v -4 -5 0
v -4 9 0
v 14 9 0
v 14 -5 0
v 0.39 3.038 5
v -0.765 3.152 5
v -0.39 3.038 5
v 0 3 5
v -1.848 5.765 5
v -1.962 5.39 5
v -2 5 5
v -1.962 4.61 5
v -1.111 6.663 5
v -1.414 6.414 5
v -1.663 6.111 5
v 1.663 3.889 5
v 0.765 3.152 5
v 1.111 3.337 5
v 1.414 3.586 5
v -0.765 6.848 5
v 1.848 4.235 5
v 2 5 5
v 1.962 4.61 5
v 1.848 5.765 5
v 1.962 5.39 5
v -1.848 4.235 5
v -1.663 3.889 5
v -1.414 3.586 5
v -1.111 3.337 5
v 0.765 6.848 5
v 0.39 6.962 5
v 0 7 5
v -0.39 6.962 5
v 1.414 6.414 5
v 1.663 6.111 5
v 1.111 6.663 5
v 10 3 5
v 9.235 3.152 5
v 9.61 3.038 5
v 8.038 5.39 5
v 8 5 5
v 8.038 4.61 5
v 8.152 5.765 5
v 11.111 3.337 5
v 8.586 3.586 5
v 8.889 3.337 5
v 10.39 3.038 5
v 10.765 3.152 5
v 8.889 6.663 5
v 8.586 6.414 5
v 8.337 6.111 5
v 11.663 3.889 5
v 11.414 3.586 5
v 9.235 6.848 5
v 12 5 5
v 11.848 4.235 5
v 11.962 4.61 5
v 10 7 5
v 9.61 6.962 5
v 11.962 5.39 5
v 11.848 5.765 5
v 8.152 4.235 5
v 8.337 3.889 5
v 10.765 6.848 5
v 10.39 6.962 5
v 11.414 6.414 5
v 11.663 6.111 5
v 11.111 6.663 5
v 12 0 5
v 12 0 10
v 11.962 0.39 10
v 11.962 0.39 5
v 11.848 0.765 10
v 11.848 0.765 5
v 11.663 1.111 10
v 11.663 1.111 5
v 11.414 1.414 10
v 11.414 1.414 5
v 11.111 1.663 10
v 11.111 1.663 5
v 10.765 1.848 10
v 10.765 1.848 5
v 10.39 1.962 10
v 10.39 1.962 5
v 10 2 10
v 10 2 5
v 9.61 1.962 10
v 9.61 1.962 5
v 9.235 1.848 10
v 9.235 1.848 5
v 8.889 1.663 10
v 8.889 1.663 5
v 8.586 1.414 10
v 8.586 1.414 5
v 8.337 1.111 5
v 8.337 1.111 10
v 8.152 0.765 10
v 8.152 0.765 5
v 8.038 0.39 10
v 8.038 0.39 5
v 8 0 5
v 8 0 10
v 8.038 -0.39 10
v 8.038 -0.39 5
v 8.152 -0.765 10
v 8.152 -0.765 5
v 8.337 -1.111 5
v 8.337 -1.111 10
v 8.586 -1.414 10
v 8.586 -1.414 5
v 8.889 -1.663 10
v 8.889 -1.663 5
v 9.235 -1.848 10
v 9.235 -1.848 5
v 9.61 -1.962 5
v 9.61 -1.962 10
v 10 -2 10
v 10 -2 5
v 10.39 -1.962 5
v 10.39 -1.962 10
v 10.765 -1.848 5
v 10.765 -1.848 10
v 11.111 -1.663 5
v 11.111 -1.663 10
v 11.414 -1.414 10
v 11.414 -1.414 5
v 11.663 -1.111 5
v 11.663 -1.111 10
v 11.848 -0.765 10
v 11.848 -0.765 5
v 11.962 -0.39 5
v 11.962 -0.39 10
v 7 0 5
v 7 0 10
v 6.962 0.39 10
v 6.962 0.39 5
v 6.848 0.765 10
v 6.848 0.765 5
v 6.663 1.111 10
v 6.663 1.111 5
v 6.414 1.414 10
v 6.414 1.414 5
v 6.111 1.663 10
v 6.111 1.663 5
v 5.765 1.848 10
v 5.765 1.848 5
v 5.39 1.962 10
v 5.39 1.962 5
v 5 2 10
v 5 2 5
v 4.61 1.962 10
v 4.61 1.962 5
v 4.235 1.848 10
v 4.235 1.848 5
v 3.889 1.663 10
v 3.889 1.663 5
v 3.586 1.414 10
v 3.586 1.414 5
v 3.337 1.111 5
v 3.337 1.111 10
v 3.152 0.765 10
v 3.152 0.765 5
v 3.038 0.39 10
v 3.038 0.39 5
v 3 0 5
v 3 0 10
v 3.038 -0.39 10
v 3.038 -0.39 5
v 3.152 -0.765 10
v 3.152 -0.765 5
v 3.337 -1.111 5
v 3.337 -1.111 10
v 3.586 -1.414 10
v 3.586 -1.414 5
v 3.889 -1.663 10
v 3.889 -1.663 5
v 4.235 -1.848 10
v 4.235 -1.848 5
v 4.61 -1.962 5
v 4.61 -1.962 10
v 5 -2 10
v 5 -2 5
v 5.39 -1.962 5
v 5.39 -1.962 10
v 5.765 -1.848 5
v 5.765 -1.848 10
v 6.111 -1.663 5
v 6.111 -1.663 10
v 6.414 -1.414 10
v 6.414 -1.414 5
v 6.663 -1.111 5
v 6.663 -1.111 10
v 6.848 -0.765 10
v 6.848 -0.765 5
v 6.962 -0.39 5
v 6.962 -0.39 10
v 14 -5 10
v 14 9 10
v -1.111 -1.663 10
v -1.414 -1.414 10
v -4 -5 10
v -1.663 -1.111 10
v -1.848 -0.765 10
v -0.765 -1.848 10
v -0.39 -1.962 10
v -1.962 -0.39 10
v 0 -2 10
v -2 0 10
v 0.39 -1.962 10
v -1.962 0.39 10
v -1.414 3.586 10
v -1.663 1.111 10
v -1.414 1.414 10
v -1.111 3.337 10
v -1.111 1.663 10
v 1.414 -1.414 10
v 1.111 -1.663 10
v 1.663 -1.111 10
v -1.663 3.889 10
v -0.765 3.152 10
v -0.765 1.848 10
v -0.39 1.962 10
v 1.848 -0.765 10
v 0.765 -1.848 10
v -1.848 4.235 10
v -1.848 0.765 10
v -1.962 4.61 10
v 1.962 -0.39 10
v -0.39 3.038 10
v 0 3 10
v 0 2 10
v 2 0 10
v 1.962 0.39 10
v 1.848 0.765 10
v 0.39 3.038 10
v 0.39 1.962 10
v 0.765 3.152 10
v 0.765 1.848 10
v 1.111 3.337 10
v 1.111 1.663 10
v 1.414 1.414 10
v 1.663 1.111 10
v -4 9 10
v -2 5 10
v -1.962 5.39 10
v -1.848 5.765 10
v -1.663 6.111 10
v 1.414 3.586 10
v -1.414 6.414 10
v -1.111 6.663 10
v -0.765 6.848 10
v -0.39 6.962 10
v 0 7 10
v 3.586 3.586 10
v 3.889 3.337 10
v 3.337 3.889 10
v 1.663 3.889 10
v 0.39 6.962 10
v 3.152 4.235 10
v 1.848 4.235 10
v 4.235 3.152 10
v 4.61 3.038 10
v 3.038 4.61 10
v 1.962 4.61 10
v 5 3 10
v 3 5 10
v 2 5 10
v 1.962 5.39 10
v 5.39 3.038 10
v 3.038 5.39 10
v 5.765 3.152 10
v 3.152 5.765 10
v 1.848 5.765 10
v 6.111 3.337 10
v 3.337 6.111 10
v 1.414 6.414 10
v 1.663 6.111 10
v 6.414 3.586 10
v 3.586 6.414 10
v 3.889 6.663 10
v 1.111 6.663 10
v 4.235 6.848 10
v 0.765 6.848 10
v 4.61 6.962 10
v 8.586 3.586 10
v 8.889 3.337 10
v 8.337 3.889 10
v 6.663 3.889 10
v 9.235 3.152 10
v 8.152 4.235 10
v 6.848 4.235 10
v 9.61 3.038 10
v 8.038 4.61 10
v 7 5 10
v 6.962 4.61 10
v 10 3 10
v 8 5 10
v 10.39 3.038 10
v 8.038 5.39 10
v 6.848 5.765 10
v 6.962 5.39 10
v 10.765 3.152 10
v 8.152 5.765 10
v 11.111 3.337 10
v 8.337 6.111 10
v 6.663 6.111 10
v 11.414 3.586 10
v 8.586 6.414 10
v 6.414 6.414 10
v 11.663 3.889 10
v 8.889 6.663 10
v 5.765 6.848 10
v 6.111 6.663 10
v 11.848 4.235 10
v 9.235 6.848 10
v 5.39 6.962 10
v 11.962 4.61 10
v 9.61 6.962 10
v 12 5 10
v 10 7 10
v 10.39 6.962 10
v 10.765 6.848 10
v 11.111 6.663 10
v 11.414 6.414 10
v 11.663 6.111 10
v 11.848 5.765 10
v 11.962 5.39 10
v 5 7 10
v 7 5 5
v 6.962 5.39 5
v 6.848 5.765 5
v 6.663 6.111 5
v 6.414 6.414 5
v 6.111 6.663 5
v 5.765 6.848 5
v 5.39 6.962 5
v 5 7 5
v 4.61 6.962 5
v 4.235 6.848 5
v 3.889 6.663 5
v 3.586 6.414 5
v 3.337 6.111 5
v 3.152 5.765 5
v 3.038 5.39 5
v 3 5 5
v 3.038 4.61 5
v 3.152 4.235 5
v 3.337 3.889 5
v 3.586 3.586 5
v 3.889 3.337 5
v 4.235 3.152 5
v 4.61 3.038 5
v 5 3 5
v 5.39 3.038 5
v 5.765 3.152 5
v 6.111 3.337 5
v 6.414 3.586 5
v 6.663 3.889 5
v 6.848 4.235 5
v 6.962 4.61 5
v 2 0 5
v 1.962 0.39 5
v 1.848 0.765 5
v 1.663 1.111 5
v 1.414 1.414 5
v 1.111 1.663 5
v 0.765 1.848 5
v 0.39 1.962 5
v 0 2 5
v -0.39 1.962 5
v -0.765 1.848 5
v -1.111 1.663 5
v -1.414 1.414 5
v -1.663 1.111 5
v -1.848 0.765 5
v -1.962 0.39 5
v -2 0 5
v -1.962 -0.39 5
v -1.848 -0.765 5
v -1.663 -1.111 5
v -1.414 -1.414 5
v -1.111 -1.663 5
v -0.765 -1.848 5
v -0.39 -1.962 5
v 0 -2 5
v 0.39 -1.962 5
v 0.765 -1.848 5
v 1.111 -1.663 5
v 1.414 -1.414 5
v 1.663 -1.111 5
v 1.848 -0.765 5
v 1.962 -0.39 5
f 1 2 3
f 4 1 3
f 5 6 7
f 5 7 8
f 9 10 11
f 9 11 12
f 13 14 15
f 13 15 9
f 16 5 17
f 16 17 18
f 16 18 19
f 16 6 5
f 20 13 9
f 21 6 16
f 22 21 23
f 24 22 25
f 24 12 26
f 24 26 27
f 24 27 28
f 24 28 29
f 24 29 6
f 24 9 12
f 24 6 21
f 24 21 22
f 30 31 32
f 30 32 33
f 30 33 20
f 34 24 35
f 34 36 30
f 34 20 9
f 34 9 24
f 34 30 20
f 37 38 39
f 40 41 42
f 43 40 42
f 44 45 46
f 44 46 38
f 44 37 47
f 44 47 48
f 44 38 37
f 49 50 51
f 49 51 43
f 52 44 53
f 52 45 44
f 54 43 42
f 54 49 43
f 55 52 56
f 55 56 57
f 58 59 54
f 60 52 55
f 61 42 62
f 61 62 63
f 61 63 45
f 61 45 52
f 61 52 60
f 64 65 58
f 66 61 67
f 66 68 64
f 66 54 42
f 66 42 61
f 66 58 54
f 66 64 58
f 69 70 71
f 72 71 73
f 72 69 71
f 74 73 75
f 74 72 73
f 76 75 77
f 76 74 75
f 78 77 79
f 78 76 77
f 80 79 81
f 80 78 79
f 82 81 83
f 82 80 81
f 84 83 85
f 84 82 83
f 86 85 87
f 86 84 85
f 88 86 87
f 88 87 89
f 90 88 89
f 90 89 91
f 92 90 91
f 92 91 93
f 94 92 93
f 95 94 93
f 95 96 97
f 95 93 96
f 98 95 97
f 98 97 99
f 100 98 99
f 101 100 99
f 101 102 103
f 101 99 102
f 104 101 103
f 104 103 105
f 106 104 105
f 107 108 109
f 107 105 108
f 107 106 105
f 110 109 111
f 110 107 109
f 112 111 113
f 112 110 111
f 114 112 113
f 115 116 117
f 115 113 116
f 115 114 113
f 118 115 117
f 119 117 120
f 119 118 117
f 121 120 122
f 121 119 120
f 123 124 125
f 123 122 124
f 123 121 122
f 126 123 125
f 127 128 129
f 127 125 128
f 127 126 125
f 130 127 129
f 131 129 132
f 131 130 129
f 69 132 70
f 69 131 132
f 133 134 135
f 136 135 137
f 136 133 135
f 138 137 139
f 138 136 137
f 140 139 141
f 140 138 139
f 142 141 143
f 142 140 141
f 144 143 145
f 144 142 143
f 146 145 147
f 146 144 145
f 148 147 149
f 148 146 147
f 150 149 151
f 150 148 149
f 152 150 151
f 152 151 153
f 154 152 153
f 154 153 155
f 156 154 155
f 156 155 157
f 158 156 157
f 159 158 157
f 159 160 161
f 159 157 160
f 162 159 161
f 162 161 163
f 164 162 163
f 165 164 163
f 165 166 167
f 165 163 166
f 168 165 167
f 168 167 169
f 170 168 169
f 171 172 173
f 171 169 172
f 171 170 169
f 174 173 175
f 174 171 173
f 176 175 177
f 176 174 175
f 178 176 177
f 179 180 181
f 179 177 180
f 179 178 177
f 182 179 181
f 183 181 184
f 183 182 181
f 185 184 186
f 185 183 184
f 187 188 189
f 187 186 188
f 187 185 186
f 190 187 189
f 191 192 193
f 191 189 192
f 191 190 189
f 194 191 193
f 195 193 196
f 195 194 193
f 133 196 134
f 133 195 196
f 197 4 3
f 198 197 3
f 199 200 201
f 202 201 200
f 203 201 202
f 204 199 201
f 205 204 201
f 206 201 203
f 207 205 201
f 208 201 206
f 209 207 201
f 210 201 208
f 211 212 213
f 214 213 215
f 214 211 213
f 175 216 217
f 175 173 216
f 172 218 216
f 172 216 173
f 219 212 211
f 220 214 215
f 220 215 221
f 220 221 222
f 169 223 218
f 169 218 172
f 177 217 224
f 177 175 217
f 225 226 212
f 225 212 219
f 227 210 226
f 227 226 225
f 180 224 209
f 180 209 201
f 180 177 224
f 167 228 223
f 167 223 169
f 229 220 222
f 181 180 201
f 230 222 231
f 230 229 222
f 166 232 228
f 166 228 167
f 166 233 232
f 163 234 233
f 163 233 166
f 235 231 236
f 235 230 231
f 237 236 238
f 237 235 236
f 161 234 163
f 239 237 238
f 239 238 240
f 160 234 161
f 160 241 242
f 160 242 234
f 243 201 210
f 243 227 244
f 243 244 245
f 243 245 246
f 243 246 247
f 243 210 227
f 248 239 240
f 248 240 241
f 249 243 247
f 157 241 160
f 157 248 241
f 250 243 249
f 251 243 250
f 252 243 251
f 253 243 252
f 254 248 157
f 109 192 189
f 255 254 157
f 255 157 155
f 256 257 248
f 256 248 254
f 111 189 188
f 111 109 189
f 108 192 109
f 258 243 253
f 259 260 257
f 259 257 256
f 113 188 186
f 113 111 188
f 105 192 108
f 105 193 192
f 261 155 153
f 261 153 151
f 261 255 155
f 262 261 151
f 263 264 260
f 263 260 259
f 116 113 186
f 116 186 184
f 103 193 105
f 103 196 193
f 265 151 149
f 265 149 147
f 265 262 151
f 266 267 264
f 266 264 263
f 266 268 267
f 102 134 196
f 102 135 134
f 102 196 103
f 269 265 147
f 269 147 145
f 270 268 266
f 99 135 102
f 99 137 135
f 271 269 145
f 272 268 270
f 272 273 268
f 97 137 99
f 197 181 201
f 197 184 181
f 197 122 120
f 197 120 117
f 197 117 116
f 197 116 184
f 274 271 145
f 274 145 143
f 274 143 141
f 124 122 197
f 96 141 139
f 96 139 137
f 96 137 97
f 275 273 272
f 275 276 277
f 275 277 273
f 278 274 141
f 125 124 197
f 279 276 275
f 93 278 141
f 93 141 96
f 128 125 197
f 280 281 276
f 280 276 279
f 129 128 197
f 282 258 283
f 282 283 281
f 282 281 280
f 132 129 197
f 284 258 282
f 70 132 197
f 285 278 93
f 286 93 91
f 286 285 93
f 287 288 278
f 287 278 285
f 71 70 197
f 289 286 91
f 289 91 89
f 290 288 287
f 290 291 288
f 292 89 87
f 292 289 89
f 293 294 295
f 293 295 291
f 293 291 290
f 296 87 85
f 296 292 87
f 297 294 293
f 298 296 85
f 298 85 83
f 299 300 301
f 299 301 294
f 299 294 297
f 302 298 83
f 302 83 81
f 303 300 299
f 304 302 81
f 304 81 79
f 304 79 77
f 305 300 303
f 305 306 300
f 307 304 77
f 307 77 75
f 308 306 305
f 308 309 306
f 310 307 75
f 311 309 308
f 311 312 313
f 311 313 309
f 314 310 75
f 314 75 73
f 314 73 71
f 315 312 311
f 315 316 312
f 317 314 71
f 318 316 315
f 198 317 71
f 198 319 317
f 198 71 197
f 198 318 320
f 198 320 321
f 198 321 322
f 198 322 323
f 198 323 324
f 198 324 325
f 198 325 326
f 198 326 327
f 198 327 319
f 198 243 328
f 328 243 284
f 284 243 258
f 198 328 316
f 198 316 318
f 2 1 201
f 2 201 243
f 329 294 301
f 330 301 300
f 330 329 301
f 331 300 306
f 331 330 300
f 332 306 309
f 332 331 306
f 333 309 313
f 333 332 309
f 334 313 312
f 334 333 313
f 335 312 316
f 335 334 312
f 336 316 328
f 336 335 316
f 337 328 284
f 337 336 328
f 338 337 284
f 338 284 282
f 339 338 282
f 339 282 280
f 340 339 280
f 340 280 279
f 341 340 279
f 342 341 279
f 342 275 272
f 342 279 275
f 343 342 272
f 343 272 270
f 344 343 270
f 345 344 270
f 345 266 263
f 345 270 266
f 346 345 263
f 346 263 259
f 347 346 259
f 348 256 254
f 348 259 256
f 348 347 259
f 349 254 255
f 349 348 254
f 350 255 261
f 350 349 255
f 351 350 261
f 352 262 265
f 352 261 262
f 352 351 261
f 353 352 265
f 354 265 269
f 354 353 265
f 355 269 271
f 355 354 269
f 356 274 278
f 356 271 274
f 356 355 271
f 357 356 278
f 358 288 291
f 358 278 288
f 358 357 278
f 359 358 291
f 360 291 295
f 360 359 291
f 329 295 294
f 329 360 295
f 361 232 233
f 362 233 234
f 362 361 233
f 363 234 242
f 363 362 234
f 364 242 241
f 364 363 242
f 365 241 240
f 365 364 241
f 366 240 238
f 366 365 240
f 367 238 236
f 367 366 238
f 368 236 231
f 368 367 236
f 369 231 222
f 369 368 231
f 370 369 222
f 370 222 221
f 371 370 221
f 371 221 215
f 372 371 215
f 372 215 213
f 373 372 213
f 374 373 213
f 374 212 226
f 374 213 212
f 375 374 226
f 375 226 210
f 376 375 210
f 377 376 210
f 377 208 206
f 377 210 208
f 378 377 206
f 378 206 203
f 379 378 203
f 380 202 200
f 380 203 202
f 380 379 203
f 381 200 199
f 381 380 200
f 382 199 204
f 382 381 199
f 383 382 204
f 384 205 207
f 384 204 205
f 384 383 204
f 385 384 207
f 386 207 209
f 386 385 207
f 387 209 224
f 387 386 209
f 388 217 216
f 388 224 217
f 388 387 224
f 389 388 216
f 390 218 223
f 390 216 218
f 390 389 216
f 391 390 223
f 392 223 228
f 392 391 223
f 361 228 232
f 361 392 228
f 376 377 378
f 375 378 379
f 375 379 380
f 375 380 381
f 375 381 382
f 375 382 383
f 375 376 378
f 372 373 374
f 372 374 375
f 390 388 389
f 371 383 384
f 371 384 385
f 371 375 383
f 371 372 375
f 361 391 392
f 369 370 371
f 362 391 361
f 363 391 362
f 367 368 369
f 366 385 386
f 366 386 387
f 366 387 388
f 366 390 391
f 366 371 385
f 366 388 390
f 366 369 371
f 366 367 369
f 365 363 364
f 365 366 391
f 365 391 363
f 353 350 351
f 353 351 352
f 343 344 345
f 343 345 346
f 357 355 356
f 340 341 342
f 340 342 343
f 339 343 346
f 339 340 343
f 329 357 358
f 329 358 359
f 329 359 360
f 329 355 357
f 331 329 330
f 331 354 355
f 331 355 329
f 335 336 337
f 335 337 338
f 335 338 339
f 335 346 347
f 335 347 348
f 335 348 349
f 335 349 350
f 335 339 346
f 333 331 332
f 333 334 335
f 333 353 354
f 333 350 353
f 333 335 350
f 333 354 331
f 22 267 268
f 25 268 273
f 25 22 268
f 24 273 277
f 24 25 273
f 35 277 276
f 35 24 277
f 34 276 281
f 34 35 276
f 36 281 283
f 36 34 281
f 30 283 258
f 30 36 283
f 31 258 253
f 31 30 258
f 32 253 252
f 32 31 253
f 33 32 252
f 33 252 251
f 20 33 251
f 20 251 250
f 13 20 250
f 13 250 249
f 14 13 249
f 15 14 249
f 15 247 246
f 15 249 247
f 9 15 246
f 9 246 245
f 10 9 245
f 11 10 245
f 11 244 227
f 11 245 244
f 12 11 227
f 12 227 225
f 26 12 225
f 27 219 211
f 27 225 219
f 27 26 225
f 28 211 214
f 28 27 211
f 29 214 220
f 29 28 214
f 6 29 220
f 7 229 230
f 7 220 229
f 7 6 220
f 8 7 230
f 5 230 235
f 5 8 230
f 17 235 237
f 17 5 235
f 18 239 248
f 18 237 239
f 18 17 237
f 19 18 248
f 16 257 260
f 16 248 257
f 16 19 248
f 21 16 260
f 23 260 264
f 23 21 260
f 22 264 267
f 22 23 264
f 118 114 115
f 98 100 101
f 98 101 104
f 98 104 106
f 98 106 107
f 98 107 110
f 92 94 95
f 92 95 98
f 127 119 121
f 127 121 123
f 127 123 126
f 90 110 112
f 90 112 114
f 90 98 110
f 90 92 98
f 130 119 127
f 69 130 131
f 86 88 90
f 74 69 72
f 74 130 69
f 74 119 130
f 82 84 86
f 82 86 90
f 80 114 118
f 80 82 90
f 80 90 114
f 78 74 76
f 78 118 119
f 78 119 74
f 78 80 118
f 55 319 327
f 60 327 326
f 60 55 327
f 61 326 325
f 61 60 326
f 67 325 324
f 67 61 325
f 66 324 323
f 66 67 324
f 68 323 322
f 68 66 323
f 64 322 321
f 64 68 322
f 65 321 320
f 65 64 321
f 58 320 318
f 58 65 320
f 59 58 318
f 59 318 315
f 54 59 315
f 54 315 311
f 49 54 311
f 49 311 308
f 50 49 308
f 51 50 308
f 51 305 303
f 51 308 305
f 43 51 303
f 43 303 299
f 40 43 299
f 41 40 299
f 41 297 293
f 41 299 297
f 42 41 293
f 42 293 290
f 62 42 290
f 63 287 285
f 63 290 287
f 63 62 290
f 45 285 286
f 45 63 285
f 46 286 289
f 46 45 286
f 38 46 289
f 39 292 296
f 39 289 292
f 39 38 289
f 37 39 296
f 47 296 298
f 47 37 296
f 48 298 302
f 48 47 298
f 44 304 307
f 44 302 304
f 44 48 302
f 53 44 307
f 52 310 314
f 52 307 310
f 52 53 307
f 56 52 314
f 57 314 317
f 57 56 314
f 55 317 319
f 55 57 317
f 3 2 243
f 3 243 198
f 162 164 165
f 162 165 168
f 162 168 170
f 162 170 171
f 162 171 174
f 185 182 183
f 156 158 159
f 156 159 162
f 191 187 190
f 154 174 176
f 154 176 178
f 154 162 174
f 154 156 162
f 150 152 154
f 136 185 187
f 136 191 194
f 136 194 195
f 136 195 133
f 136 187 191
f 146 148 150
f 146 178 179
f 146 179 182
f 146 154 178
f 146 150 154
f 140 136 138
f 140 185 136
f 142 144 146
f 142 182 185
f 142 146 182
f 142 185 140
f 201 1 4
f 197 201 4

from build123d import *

# Parameters (mm, degrees)
CYLINDER001_R     = 2
CYLINDER001_DEPTH = 10
CYLINDER002_R     = 2
CYLINDER002_DEPTH = 10
CYLINDER003_R     = 2
CYLINDER003_DEPTH = 10
CYLINDER004_R     = 2
CYLINDER004_DEPTH = 10
CYLINDER005_R     = 2
CYLINDER005_DEPTH = 10
CYLINDER_R        = 2
CYLINDER_DEPTH    = 10
BOX_W             = 18
BOX_H             = 14
BOX_DEPTH         = 10


with BuildPart() as cilindre2:
    # Cylinder001 → Cylinder001 (new body)
    with BuildSketch(Plane(origin=(0, 5, 5), x_dir=(1, 0, 0), z_dir=(0, 0, 1))):
        Circle(CYLINDER001_R)
    extrude(amount=CYLINDER001_DEPTH)


with BuildPart() as cilindre3:
    # Cylinder002 → Cylinder002 (new body)
    with BuildSketch(Plane(origin=(5, 5, 5), x_dir=(1, 0, 0), z_dir=(0, 0, 1))):
        Circle(CYLINDER002_R)
    extrude(amount=CYLINDER002_DEPTH)


with BuildPart() as cilindre4:
    # Cylinder003 → Cylinder003 (new body)
    with BuildSketch(Plane(origin=(5, 0, 5), x_dir=(1, 0, 0), z_dir=(0, 0, 1))):
        Circle(CYLINDER003_R)
    extrude(amount=CYLINDER003_DEPTH)


with BuildPart() as cilindre5:
    # Cylinder004 → Cylinder004 (new body)
    with BuildSketch(Plane(origin=(10, 0, 5), x_dir=(1, 0, 0), z_dir=(0, 0, 1))):
        Circle(CYLINDER004_R)
    extrude(amount=CYLINDER004_DEPTH)


with BuildPart() as cilindre6:
    # Cylinder005 → Cylinder005 (new body)
    with BuildSketch(Plane(origin=(10, 5, 5), x_dir=(1, 0, 0), z_dir=(0, 0, 1))):
        Circle(CYLINDER005_R)
    extrude(amount=CYLINDER005_DEPTH)


with BuildPart() as forats:
    # Cylinder → Cylinder (new body)
    with BuildSketch(Plane.XY.offset(5)):
        Circle(CYLINDER_R)
    extrude(amount=CYLINDER_DEPTH)

    # Fusion: union cilindre2, cilindre3, cilindre4, cilindre5, cilindre6
    add(cilindre2.part)
    add(cilindre3.part)
    add(cilindre4.part)
    add(cilindre5.part)
    add(cilindre6.part)


with BuildPart() as cut:
    # Box → Box (new body)
    with BuildSketch(Plane(origin=(-4, -5, 0), x_dir=(1, 0, 0), z_dir=(0, 0, 1))):
        with Locations((9, 7)):
            Rectangle(BOX_W, BOX_H)
    extrude(amount=BOX_DEPTH)

    # Cut: cut forats
    add(forats.part, mode=Mode.SUBTRACT)


solid = cut.part
